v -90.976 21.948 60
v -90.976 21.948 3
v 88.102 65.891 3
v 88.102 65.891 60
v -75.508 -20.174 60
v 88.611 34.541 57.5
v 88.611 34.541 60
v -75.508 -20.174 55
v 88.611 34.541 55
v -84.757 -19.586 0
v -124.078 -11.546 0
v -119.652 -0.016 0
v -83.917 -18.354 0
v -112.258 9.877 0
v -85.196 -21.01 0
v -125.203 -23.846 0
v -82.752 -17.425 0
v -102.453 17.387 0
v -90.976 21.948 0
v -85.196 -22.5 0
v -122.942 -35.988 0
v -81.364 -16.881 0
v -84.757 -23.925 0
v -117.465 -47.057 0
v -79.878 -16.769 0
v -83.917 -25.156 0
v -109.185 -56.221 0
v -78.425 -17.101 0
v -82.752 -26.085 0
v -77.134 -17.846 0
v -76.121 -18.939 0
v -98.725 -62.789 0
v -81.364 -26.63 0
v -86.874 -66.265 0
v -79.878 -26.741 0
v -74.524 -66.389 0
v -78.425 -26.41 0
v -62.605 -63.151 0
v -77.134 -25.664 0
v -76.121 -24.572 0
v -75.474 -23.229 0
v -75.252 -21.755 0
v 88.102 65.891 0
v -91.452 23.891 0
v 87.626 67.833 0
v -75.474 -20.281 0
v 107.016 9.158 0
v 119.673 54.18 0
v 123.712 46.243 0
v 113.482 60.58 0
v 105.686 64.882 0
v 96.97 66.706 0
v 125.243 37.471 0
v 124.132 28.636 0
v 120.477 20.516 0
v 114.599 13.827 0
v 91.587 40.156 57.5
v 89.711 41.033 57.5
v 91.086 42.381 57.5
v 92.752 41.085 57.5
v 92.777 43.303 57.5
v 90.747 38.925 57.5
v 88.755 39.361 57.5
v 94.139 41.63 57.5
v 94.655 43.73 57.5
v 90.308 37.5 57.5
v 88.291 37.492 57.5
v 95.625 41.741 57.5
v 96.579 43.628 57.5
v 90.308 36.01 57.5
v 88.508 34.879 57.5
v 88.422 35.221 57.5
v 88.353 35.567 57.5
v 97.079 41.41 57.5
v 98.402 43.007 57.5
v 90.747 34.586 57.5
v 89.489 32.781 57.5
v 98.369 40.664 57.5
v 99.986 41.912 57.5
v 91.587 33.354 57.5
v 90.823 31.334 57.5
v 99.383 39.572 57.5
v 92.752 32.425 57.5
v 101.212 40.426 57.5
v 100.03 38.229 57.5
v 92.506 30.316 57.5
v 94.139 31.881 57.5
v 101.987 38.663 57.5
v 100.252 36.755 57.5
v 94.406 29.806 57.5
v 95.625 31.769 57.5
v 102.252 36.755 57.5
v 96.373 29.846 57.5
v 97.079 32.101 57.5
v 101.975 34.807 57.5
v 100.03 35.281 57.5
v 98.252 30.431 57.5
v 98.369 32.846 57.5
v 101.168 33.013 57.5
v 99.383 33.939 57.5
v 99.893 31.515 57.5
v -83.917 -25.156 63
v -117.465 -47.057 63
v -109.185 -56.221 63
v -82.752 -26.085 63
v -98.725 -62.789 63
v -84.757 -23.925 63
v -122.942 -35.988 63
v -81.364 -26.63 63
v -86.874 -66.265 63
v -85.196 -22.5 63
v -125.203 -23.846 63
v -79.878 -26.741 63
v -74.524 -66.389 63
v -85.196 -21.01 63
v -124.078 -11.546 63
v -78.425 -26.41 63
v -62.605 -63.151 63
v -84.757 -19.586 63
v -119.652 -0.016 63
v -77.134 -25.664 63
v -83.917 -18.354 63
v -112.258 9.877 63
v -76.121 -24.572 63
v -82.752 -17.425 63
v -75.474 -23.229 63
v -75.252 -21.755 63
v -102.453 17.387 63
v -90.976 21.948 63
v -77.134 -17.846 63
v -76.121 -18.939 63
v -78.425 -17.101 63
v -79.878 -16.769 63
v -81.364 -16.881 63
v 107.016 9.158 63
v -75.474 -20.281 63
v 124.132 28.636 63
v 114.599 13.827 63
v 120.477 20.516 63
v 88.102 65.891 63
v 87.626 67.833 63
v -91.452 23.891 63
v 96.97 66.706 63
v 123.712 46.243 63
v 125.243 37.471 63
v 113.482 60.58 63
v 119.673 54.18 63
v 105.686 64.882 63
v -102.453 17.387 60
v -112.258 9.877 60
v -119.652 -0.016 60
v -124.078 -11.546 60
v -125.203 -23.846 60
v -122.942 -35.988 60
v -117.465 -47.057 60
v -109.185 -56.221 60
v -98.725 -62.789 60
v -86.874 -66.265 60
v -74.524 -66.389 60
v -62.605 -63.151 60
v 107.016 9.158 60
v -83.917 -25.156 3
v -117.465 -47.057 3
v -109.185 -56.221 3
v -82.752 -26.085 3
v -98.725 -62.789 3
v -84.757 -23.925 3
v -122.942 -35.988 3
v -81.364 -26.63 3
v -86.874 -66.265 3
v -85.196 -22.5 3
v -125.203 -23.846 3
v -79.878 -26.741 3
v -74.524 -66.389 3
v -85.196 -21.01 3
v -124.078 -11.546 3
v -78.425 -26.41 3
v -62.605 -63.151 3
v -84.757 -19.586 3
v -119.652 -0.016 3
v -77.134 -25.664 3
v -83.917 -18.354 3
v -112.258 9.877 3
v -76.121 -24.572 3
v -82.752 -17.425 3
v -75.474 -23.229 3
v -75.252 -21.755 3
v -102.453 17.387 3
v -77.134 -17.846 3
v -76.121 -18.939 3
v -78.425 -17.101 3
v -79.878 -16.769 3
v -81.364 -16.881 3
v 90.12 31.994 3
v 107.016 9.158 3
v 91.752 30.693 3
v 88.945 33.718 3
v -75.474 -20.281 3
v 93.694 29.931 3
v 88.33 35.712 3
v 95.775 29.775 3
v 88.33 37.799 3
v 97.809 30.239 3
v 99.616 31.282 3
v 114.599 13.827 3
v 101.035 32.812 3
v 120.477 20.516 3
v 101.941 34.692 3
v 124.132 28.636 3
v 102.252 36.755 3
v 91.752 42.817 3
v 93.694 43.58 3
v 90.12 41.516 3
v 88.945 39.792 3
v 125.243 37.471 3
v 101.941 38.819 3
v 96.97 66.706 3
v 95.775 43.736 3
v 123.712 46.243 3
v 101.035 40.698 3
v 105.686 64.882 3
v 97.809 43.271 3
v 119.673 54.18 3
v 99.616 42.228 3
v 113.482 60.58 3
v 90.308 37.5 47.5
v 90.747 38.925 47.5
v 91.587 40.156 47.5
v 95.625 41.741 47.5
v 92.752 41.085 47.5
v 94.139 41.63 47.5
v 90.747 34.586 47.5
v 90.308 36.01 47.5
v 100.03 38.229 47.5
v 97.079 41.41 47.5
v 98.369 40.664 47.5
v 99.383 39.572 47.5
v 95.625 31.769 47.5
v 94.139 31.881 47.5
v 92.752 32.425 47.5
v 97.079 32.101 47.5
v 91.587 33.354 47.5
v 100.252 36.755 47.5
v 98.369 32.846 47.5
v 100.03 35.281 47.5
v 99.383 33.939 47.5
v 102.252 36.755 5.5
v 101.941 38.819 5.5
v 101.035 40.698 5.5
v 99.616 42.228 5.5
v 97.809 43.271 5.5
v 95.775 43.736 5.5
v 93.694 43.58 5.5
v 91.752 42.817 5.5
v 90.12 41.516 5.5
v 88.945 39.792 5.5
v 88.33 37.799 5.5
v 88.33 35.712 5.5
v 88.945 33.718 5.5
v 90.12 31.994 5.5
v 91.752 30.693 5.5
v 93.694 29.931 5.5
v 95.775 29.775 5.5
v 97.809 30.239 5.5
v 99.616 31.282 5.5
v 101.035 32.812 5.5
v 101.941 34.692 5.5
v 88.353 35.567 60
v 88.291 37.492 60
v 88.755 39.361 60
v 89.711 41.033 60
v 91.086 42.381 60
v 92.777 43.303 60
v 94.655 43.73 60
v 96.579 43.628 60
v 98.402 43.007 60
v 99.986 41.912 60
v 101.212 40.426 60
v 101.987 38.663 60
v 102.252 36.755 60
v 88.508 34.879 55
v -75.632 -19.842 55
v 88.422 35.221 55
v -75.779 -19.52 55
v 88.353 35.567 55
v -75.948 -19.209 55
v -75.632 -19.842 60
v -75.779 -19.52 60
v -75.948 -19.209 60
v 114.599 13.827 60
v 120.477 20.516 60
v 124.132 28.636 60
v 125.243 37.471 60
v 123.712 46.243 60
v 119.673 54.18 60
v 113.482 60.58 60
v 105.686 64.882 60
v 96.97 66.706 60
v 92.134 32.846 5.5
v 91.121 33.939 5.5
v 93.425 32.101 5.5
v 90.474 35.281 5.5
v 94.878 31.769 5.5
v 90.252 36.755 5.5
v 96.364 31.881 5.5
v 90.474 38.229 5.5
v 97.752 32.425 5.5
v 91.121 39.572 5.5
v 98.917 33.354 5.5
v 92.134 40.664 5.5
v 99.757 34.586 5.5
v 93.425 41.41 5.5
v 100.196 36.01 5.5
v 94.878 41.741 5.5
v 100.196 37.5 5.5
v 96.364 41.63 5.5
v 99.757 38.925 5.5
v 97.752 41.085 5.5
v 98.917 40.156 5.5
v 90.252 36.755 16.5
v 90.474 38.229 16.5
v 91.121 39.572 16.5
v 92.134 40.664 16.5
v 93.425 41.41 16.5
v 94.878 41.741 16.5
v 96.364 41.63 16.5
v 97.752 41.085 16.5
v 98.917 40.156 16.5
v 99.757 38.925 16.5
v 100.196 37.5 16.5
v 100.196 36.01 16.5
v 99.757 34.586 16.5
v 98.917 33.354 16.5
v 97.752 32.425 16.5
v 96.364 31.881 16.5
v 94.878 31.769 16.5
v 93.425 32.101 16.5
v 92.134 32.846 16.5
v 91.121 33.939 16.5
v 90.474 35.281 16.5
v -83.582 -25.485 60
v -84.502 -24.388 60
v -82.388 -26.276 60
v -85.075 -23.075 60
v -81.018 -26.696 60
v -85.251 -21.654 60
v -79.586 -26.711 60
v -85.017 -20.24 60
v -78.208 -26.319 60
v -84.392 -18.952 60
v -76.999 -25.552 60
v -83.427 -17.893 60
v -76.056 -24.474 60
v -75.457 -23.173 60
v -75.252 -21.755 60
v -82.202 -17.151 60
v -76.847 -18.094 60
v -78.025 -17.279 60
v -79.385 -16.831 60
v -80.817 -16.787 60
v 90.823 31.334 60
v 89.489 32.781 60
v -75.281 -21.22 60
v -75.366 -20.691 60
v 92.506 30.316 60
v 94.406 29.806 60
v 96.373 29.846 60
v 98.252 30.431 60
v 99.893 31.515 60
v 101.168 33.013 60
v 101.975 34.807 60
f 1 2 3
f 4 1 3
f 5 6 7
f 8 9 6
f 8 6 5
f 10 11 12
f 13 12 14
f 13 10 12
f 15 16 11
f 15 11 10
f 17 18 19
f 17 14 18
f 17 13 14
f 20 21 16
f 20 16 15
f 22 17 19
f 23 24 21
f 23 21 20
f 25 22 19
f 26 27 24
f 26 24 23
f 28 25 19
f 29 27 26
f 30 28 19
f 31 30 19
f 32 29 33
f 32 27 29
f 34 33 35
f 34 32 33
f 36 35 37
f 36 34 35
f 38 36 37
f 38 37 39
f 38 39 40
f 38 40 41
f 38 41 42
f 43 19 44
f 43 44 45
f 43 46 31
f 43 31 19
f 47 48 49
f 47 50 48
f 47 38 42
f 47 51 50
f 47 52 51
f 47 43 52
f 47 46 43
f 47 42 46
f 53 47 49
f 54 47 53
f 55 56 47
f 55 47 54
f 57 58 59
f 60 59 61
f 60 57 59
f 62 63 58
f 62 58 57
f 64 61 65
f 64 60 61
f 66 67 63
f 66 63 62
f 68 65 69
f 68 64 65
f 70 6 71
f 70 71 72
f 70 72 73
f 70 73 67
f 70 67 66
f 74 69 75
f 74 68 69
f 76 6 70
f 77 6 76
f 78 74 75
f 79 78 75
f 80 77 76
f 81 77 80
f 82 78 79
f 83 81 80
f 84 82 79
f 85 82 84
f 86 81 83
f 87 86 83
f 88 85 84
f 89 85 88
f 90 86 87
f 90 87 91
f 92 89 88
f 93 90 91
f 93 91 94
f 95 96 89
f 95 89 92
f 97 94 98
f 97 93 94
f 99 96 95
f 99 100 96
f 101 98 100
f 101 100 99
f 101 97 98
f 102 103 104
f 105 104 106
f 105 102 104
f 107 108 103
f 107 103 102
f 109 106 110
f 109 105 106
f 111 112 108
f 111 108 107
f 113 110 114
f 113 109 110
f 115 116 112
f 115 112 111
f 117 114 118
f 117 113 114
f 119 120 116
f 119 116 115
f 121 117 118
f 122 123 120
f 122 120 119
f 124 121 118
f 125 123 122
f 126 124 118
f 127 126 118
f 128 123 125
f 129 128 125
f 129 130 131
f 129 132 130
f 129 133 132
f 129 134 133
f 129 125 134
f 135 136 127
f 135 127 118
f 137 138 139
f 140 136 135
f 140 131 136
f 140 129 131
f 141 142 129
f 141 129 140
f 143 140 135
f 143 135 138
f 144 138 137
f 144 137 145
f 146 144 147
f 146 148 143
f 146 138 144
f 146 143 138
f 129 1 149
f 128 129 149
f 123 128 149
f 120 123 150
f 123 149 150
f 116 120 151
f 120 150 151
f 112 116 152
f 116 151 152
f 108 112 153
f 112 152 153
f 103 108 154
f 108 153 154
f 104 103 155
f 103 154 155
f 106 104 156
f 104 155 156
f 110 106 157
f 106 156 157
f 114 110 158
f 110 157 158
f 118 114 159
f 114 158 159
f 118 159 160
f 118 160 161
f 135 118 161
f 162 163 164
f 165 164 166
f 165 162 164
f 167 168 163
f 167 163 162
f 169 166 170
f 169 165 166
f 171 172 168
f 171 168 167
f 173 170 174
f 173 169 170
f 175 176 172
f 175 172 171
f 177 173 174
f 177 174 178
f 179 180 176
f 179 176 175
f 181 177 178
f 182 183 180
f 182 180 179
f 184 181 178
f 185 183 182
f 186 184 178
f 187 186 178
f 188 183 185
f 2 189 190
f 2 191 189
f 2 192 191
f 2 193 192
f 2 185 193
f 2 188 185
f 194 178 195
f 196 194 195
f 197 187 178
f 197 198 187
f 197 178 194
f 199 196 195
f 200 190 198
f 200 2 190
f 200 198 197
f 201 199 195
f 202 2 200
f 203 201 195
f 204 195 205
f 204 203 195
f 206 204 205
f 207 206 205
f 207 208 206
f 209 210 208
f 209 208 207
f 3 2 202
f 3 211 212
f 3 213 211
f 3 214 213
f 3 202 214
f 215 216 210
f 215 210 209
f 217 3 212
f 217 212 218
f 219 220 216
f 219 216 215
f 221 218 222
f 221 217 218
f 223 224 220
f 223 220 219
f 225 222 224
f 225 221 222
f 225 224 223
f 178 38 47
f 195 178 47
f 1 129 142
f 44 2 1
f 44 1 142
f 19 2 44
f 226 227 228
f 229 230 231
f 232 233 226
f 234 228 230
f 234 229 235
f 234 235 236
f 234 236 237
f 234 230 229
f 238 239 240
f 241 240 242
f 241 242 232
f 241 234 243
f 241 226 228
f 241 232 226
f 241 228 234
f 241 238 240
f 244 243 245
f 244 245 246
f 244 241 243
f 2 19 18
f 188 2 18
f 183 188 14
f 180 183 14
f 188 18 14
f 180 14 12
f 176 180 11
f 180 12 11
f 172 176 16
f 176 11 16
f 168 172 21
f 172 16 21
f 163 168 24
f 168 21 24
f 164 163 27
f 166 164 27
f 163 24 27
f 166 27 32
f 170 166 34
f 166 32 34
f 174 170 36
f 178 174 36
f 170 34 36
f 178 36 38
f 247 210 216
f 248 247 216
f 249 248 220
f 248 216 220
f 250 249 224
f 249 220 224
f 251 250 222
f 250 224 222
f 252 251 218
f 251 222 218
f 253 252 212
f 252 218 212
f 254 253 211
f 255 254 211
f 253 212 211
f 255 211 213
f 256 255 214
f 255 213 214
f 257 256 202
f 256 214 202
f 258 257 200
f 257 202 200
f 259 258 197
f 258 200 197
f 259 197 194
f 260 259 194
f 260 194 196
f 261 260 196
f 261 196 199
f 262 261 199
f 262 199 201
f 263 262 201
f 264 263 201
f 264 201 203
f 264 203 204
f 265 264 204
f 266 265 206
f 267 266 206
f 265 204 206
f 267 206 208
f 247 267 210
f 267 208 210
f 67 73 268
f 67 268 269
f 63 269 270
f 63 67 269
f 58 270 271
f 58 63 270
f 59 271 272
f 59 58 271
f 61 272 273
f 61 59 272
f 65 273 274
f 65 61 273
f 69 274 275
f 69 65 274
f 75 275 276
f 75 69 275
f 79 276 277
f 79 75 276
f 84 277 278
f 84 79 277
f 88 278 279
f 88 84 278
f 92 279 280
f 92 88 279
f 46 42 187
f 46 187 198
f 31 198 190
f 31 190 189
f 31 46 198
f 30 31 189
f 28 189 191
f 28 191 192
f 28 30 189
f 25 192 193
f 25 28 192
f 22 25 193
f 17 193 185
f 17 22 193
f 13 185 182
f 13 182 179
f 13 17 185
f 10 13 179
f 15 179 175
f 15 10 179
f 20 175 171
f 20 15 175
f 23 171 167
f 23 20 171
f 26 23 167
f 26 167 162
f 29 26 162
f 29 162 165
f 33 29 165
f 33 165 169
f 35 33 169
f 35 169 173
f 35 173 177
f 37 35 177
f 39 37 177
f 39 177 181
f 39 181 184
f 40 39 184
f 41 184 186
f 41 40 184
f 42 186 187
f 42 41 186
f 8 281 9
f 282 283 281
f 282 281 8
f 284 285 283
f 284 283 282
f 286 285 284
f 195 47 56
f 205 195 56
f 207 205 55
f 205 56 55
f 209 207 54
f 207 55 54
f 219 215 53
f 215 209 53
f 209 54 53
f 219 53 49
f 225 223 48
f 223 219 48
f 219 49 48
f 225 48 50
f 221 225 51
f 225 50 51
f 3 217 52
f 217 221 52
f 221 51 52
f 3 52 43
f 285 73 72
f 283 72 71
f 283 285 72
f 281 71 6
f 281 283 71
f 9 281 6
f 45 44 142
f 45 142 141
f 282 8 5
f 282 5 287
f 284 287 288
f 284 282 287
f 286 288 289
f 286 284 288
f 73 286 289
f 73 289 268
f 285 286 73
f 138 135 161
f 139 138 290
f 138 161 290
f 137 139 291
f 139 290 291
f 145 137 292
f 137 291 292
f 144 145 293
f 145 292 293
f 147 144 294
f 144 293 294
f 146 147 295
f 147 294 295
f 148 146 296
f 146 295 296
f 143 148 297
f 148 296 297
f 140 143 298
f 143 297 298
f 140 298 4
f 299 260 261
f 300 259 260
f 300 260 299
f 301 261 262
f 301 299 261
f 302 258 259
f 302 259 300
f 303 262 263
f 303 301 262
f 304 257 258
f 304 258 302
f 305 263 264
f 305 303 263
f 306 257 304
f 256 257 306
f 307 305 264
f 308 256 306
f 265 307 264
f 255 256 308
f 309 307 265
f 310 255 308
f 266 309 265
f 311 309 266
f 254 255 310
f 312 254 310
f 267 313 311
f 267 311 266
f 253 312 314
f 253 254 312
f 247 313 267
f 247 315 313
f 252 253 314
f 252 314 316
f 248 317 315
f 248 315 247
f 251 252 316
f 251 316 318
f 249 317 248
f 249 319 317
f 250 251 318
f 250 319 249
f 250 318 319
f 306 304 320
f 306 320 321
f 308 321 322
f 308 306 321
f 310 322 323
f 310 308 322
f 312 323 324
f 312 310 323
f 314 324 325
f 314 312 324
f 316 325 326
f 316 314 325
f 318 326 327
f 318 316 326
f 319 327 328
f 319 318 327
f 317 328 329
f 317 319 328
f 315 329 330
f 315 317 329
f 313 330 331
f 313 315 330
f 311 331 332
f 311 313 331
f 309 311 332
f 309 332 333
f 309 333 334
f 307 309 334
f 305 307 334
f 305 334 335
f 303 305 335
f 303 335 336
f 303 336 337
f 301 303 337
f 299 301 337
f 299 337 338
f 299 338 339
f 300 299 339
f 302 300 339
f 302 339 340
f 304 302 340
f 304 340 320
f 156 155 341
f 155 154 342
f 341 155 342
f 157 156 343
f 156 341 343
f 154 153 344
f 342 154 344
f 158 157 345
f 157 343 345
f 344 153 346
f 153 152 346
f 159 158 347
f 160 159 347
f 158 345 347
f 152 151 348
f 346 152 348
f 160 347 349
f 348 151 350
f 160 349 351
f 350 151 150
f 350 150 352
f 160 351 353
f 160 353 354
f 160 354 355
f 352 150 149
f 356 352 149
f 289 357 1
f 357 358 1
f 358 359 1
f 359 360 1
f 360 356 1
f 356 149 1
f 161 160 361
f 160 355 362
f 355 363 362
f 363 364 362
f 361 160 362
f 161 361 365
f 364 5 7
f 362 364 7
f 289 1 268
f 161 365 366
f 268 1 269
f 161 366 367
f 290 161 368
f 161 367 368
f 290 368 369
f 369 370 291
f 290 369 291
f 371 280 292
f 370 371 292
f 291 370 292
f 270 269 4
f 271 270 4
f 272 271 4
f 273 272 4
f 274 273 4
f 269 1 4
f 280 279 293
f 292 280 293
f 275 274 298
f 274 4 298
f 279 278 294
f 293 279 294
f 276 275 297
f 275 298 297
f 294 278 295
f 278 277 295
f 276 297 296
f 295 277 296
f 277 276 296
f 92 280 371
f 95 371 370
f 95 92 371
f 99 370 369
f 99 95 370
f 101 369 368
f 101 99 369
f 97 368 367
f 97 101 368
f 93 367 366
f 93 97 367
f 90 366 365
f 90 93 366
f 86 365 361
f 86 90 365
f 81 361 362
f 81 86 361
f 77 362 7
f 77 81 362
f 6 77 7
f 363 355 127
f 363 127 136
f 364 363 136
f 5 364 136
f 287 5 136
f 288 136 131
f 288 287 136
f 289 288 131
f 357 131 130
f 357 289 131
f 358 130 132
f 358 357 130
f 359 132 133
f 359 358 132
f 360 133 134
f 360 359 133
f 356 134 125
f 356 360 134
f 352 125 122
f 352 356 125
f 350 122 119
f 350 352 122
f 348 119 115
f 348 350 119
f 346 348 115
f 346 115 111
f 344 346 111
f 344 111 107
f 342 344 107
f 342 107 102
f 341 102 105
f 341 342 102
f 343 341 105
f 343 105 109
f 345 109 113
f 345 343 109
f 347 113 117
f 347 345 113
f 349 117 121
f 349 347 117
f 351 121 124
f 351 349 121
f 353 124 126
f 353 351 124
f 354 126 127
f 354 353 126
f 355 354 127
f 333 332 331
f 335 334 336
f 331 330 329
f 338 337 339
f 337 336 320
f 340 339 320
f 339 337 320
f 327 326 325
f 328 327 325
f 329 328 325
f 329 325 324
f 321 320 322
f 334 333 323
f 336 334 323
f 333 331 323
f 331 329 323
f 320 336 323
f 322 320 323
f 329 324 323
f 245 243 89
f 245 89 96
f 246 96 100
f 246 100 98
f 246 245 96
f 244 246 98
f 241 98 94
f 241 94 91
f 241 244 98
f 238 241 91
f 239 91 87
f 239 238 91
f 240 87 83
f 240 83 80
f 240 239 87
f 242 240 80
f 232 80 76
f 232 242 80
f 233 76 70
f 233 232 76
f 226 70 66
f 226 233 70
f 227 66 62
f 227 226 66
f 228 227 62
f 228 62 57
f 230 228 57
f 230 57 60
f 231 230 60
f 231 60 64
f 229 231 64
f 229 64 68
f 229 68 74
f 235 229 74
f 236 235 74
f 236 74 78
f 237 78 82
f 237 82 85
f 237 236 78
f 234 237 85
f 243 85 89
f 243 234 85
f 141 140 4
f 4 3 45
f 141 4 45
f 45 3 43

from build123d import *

# Parameters (mm, degrees)
SKETCH1_R           = 45
SKETCH1_R_2         = 5
SKETCH1_R_3         = 30
BOSS_EXTRUDE1_DEPTH = 3
SKETCH2_W           = 184.390889146
SKETCH2_H           = 63
BOSS_EXTRUDE2_DEPTH = 2
BOSS_EXTRUDE3_START = -3
SKETCH3_R           = 45
SKETCH3_R_2         = 5
SKETCH3_R_3         = 30
BOSS_EXTRUDE3_DEPTH = 3
SKETCH5_R           = 7
SKETCH5_R_2         = 5
BOSS_EXTRUDE4_DEPTH = 2.5
BOSS_EXTRUDE5_START = 2.5
SKETCH7_R           = 7
SKETCH7_R_2         = 5
BOSS_EXTRUDE5_DEPTH = 2.5
SKETCH11_R          = 5
BOSS_EXTRUDE6_DEPTH = 5.5
BOSS_EXTRUDE7_START = 10
SKETCH12_R          = 5
BOSS_EXTRUDE7_DEPTH = 10
SKETCH13_R          = 5
BOSS_EXTRUDE8_DEPTH = 16.5
BOSS_EXTRUDE9_START = 5
BOSS_EXTRUDE9_DEPTH = 5


with BuildPart() as part:
    # Sketch1 → Boss-Extrude1 (new body)
    # profile 1 of 3: a face of its own
    with BuildSketch(Plane.XY):
        with BuildLine():
            Line((88.102445193, 65.890888235), (-90.975875137, 21.948253042))
            ThreePointArc((-90.975875137, 21.948253042), (-52.481172674, 13.65368388), (-35.251817171, -21.755231724))
            ThreePointArc((-35.251817171, -21.755231724), (-42.707811228, -46.563448464), (-62.605044629, -63.150780021))
            Line((-62.605044629, -63.150780021), (107.016332199, 9.158199526))
            ThreePointArc((107.016332199, 9.158199526), (66.791768359, 27.267048462), (88.102445193, 65.890888235))
        make_face()
    # profile 2 of 3: a face of its own
    with BuildSketch(Plane.XY):
        with Locations((-80.251817171, -21.755231724)):
            Circle(SKETCH1_R)
        with Locations((-80.251817171, -21.755231724)):
            Circle(SKETCH1_R_2, mode=Mode.SUBTRACT)
    # profile 3 of 3: a face of its own
    with BuildSketch(Plane.XY):
        with Locations((95.251817171, 36.755231724)):
            Circle(SKETCH1_R_3)
        with Locations((95.251817171, 36.755231724)):
            Circle(SKETCH1_R_2, mode=Mode.SUBTRACT)
    extrude(amount=BOSS_EXTRUDE1_DEPTH)

    # Sketch2 → Boss-Extrude2 (add)
    with BuildSketch(Plane(origin=(-10.246616026, 41.75777759, 0), x_dir=(0.971188550366469, 0.23831239925164718, 0), z_dir=(-0.23831239925164718, 0.971188550366469, 0))):
        with Locations((9.071257122, -31.5)):
            Rectangle(SKETCH2_W, SKETCH2_H)
    extrude(amount=BOSS_EXTRUDE2_DEPTH)

    # Sketch3 → Boss-Extrude3 (add)
    # profile 1 of 3: a face of its own
    with BuildSketch(Plane.XY.offset(63).offset(BOSS_EXTRUDE3_START)):
        with Locations((-80.251817171, -21.755231724)):
            Circle(SKETCH3_R)
        with Locations((-80.251817171, -21.755231724)):
            Circle(SKETCH3_R_2, mode=Mode.SUBTRACT)
    # profile 2 of 3: a face of its own
    with BuildSketch(Plane.XY.offset(63).offset(BOSS_EXTRUDE3_START)):
        with BuildLine():
            ThreePointArc((-35.251817171, -21.755231724), (-42.707811228, -46.563448464), (-62.605044629, -63.150780021))
            Line((-62.605044629, -63.150780021), (107.016332199, 9.158199526))
            ThreePointArc((107.016332199, 9.158199526), (66.791768359, 27.267048462), (88.102445193, 65.890888235))
            Line((88.102445193, 65.890888235), (-90.975875137, 21.948253042))
            ThreePointArc((-90.975875137, 21.948253042), (-52.481172674, 13.65368388), (-35.251817171, -21.755231724))
        make_face()
    # profile 3 of 3: a face of its own
    with BuildSketch(Plane.XY.offset(63).offset(BOSS_EXTRUDE3_START)):
        with Locations((95.251817171, 36.755231724)):
            Circle(SKETCH3_R_3)
        with Locations((95.251817171, 36.755231724)):
            Circle(SKETCH3_R_2, mode=Mode.SUBTRACT)
    extrude(amount=BOSS_EXTRUDE3_DEPTH)

    # Sketch5 → Boss-Extrude4 (add)
    with BuildSketch(Plane.XY.offset(3)):
        with Locations((95.251817171, 36.755231724)):
            Circle(SKETCH5_R)
        with Locations((95.251817171, 36.755231724)):
            Circle(SKETCH5_R_2, mode=Mode.SUBTRACT)
    extrude(amount=BOSS_EXTRUDE4_DEPTH)

    # Sketch7 → Boss-Extrude5 (add)
    with BuildSketch(Plane(origin=(0, 0, 60), x_dir=(-1, 0, 0), z_dir=(0, 0, -1)).offset(BOSS_EXTRUDE5_START)):
        with Locations(Location((-95.251817171, 36.755231724, 0), (0, 0, 180))):
            Circle(SKETCH7_R)
        with Locations(Location((-95.251817171, 36.755231724, 0), (0, 0, 180))):
            Circle(SKETCH7_R_2, mode=Mode.SUBTRACT)
    extrude(amount=-BOSS_EXTRUDE5_DEPTH)

    # Sketch11 → Boss-Extrude6 (add)
    with BuildSketch(Plane(origin=(0, 0, 57.5), x_dir=(-1, 0, 0), z_dir=(0, 0, -1))):
        with Locations(Location((-95.251817171, 36.755231724, 0), (0, 0, 180))):
            Circle(SKETCH11_R)
    extrude(amount=-BOSS_EXTRUDE6_DEPTH)

    # Sketch12 → Boss-Extrude7 (add)
    with BuildSketch(Plane(origin=(0, 0, 57.5), x_dir=(-1, 0, 0), z_dir=(0, 0, -1)).offset(BOSS_EXTRUDE7_START)):
        with Locations(Location((-95.251817171, 36.755231724, 0), (0, 0, 180))):
            Circle(SKETCH12_R)
    extrude(amount=-BOSS_EXTRUDE7_DEPTH)

    # Sketch13 → Boss-Extrude8 (add)
    with BuildSketch(Plane(origin=(0, 0, 0), x_dir=(-1, 0, 0), z_dir=(0, 0, -1))):
        with Locations((-95.251817171, 36.755231724)):
            Circle(SKETCH13_R)
    extrude(amount=-BOSS_EXTRUDE8_DEPTH)

    # Sketch15 → Boss-Extrude9 (add)
    with BuildSketch(Plane(origin=(0, 0, 60), x_dir=(-1, 0, 0), z_dir=(0, 0, -1)).offset(BOSS_EXTRUDE9_START)):
        with BuildLine():
            ThreePointArc((-88.353478337, 35.566568046), (-88.462927218, 35.049074286), (-88.611139115, 34.541322296))
            Line((-88.611139115, 34.541322296), (75.508475702, -20.173867847))
            ThreePointArc((75.508475702, -20.173867847), (75.702840867, -19.679945097), (75.94847072, -19.20940979))
            Line((75.94847072, -19.20940979), (-88.353478337, 35.566568046))
        make_face()
    extrude(amount=-BOSS_EXTRUDE9_DEPTH)


solid = part.part
